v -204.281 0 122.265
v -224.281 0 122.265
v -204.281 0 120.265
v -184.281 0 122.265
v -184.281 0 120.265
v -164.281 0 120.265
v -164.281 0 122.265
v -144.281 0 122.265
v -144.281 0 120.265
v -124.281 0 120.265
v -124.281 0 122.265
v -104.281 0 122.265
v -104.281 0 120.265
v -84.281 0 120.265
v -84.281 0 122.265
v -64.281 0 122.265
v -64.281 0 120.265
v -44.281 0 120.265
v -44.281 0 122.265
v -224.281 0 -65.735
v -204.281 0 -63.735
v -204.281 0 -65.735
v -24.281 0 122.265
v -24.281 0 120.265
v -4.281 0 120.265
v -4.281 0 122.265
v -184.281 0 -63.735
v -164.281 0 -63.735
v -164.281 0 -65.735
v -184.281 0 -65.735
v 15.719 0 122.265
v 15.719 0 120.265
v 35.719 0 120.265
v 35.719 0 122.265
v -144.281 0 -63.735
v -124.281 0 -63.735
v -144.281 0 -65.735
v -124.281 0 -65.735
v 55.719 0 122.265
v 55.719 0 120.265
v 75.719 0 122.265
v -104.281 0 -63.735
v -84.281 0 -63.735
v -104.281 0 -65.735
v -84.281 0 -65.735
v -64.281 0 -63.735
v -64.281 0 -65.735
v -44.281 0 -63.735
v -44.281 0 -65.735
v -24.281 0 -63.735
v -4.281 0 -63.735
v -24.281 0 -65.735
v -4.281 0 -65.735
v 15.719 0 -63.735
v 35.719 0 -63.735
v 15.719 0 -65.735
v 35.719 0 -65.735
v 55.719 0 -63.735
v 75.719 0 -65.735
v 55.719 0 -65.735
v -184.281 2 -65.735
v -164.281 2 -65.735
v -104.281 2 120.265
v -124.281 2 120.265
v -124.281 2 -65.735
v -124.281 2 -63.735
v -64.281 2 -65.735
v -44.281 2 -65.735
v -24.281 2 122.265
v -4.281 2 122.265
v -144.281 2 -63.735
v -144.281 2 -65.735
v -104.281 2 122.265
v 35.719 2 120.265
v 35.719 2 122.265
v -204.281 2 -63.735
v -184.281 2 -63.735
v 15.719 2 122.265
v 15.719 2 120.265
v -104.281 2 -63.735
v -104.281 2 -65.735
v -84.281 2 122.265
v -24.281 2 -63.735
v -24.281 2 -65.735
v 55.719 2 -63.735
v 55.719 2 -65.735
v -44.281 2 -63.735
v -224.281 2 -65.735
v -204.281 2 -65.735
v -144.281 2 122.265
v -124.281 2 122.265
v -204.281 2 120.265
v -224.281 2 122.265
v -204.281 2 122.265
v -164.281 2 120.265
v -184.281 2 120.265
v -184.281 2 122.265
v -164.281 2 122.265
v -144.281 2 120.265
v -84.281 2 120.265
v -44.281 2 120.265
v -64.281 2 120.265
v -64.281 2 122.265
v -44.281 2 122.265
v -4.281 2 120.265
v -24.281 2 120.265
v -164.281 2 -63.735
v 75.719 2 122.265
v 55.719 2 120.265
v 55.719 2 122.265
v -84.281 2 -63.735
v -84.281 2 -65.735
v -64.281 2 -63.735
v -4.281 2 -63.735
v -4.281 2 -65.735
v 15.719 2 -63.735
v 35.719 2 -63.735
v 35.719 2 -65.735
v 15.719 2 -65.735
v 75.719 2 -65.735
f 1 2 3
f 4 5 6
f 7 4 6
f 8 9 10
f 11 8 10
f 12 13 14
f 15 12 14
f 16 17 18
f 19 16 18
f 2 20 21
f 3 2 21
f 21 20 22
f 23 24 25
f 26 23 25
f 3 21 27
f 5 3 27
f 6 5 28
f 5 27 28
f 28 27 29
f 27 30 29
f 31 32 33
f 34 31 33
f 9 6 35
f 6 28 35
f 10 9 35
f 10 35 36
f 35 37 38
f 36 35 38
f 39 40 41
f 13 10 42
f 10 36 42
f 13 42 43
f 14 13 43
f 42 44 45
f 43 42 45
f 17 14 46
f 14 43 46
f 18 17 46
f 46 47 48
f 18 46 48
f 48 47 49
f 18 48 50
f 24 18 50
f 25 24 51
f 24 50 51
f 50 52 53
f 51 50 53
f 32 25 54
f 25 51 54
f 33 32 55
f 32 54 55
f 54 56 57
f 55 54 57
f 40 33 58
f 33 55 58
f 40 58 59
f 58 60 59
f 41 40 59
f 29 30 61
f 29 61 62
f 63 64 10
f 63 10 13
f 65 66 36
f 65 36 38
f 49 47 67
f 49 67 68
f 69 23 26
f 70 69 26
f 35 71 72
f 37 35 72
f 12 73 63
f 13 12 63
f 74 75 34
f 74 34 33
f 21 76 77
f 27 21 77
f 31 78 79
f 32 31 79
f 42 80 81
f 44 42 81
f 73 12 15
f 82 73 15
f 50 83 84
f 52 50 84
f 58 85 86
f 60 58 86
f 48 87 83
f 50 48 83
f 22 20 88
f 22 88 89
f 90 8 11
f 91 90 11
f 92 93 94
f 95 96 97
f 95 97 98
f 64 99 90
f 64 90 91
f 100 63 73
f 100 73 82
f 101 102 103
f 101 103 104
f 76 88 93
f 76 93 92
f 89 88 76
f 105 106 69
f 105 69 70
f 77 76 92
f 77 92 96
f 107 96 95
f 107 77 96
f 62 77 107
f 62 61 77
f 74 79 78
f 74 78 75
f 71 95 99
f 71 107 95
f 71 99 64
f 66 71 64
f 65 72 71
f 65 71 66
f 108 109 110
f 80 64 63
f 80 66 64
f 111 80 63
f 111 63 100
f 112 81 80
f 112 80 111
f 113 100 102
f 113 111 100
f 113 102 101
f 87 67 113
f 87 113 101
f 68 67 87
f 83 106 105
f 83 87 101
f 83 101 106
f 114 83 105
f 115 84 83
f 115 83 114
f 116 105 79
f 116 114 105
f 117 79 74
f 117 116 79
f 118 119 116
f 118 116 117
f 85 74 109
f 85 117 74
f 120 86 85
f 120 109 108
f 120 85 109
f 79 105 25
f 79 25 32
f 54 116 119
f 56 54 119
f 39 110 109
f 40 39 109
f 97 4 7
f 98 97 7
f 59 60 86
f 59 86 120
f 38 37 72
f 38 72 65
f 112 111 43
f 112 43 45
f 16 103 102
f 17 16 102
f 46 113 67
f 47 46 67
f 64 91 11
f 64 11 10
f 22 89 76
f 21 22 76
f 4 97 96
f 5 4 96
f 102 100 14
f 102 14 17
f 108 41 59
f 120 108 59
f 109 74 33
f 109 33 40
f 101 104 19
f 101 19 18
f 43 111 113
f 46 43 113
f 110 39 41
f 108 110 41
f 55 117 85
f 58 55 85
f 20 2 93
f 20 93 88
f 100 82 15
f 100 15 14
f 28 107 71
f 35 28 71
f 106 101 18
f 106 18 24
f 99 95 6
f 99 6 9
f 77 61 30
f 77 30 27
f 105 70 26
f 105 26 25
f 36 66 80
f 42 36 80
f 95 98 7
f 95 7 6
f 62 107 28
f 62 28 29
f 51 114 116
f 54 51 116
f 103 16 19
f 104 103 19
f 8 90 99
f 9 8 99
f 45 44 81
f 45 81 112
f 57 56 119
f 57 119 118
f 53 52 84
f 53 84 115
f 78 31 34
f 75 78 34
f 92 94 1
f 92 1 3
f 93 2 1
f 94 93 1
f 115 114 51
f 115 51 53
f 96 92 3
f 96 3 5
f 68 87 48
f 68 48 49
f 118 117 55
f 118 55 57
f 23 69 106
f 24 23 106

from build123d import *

# Parameters (mm, degrees)
SKETCH1_W               = 300
SKETCH1_H               = 188
BOSS_EXTRUDE1_DEPTH     = 2
SKETCH2_W               = 20
SKETCH2_H               = 2
CUT_EXTRUDE1_DEPTH      = 4
LPATTERN1_COUNT         = 8
LPATTERN1_PITCH         = 40
MIRROR1_COPY_1_SKETCH_W = 20
MIRROR1_COPY_1_SKETCH_H = 2
MIRROR1_COPY_1_DEPTH    = 4
MIRROR1_COPY_2_SKETCH_W = 20
MIRROR1_COPY_2_SKETCH_H = 2
MIRROR1_COPY_2_DEPTH    = 4
MIRROR1_COPY_3_SKETCH_W = 20
MIRROR1_COPY_3_SKETCH_H = 2
MIRROR1_COPY_3_DEPTH    = 4
MIRROR1_COPY_4_SKETCH_W = 20
MIRROR1_COPY_4_SKETCH_H = 2
MIRROR1_COPY_4_DEPTH    = 4
MIRROR1_COPY_5_SKETCH_W = 20
MIRROR1_COPY_5_SKETCH_H = 2
MIRROR1_COPY_5_DEPTH    = 4
MIRROR1_COPY_6_SKETCH_W = 20
MIRROR1_COPY_6_SKETCH_H = 2
MIRROR1_COPY_6_DEPTH    = 4
MIRROR1_COPY_7_SKETCH_W = 20
MIRROR1_COPY_7_SKETCH_H = 2
MIRROR1_COPY_7_DEPTH    = 4


with BuildPart() as part:
    # Sketch1 → Boss-Extrude1 (new body)
    with BuildSketch(Plane(origin=(0, 0, 0), x_dir=(1, 0, 0), z_dir=(0, 1, 0))):
        with Locations((-74.28137931, -28.264827586)):
            Rectangle(SKETCH1_W, SKETCH1_H)
    extrude(amount=BOSS_EXTRUDE1_DEPTH)

    # Sketch2 → Cut-Extrude1 (cut)
    with BuildSketch(Plane(origin=(0, 2, 0), x_dir=(1, 0, 0), z_dir=(0, 1, 0))):
        with Locations((-194.28137931, -121.264827586)):
            Rectangle(SKETCH2_W, SKETCH2_H)
    cut_extrude1 = extrude(amount=-CUT_EXTRUDE1_DEPTH, mode=Mode.SUBTRACT)

    # LPattern1: Cut-Extrude1 ×8
    with Locations(*[(i * LPATTERN1_PITCH, 0, 0) for i in range(1, LPATTERN1_COUNT)]):
        add(cut_extrude1, mode=Mode.SUBTRACT)

    # Mirror1: Cut-Extrude1 across plane
    add(cut_extrude1.mirror(Plane.XY.offset(28.264827586)), mode=Mode.SUBTRACT)

    # Mirror1 copy 1 sketch → Mirror1 copy 1 (cut)
    with BuildSketch(Plane(origin=(40, 2, 56.529655172), x_dir=(1, 0, 0), z_dir=(0, 1, 0))):
        with Locations((-194.28137931, 121.264827586)):
            Rectangle(MIRROR1_COPY_1_SKETCH_W, MIRROR1_COPY_1_SKETCH_H)
    extrude(amount=-MIRROR1_COPY_1_DEPTH, mode=Mode.SUBTRACT)

    # Mirror1 copy 2 sketch → Mirror1 copy 2 (cut)
    with BuildSketch(Plane(origin=(80, 2, 56.529655172), x_dir=(1, 0, 0), z_dir=(0, 1, 0))):
        with Locations((-194.28137931, 121.264827586)):
            Rectangle(MIRROR1_COPY_2_SKETCH_W, MIRROR1_COPY_2_SKETCH_H)
    extrude(amount=-MIRROR1_COPY_2_DEPTH, mode=Mode.SUBTRACT)

    # Mirror1 copy 3 sketch → Mirror1 copy 3 (cut)
    with BuildSketch(Plane(origin=(120, 2, 56.529655172), x_dir=(1, 0, 0), z_dir=(0, 1, 0))):
        with Locations((-194.28137931, 121.264827586)):
            Rectangle(MIRROR1_COPY_3_SKETCH_W, MIRROR1_COPY_3_SKETCH_H)
    extrude(amount=-MIRROR1_COPY_3_DEPTH, mode=Mode.SUBTRACT)

    # Mirror1 copy 4 sketch → Mirror1 copy 4 (cut)
    with BuildSketch(Plane(origin=(160, 2, 56.529655172), x_dir=(1, 0, 0), z_dir=(0, 1, 0))):
        with Locations((-194.28137931, 121.264827586)):
            Rectangle(MIRROR1_COPY_4_SKETCH_W, MIRROR1_COPY_4_SKETCH_H)
    extrude(amount=-MIRROR1_COPY_4_DEPTH, mode=Mode.SUBTRACT)

    # Mirror1 copy 5 sketch → Mirror1 copy 5 (cut)
    with BuildSketch(Plane(origin=(200, 2, 56.529655172), x_dir=(1, 0, 0), z_dir=(0, 1, 0))):
        with Locations((-194.28137931, 121.264827586)):
            Rectangle(MIRROR1_COPY_5_SKETCH_W, MIRROR1_COPY_5_SKETCH_H)
    extrude(amount=-MIRROR1_COPY_5_DEPTH, mode=Mode.SUBTRACT)

    # Mirror1 copy 6 sketch → Mirror1 copy 6 (cut)
    with BuildSketch(Plane(origin=(240, 2, 56.529655172), x_dir=(1, 0, 0), z_dir=(0, 1, 0))):
        with Locations((-194.28137931, 121.264827586)):
            Rectangle(MIRROR1_COPY_6_SKETCH_W, MIRROR1_COPY_6_SKETCH_H)
    extrude(amount=-MIRROR1_COPY_6_DEPTH, mode=Mode.SUBTRACT)

    # Mirror1 copy 7 sketch → Mirror1 copy 7 (cut)
    with BuildSketch(Plane(origin=(280, 2, 56.529655172), x_dir=(1, 0, 0), z_dir=(0, 1, 0))):
        with Locations((-194.28137931, 121.264827586)):
            Rectangle(MIRROR1_COPY_7_SKETCH_W, MIRROR1_COPY_7_SKETCH_H)
    extrude(amount=-MIRROR1_COPY_7_DEPTH, mode=Mode.SUBTRACT)


solid = part.part
